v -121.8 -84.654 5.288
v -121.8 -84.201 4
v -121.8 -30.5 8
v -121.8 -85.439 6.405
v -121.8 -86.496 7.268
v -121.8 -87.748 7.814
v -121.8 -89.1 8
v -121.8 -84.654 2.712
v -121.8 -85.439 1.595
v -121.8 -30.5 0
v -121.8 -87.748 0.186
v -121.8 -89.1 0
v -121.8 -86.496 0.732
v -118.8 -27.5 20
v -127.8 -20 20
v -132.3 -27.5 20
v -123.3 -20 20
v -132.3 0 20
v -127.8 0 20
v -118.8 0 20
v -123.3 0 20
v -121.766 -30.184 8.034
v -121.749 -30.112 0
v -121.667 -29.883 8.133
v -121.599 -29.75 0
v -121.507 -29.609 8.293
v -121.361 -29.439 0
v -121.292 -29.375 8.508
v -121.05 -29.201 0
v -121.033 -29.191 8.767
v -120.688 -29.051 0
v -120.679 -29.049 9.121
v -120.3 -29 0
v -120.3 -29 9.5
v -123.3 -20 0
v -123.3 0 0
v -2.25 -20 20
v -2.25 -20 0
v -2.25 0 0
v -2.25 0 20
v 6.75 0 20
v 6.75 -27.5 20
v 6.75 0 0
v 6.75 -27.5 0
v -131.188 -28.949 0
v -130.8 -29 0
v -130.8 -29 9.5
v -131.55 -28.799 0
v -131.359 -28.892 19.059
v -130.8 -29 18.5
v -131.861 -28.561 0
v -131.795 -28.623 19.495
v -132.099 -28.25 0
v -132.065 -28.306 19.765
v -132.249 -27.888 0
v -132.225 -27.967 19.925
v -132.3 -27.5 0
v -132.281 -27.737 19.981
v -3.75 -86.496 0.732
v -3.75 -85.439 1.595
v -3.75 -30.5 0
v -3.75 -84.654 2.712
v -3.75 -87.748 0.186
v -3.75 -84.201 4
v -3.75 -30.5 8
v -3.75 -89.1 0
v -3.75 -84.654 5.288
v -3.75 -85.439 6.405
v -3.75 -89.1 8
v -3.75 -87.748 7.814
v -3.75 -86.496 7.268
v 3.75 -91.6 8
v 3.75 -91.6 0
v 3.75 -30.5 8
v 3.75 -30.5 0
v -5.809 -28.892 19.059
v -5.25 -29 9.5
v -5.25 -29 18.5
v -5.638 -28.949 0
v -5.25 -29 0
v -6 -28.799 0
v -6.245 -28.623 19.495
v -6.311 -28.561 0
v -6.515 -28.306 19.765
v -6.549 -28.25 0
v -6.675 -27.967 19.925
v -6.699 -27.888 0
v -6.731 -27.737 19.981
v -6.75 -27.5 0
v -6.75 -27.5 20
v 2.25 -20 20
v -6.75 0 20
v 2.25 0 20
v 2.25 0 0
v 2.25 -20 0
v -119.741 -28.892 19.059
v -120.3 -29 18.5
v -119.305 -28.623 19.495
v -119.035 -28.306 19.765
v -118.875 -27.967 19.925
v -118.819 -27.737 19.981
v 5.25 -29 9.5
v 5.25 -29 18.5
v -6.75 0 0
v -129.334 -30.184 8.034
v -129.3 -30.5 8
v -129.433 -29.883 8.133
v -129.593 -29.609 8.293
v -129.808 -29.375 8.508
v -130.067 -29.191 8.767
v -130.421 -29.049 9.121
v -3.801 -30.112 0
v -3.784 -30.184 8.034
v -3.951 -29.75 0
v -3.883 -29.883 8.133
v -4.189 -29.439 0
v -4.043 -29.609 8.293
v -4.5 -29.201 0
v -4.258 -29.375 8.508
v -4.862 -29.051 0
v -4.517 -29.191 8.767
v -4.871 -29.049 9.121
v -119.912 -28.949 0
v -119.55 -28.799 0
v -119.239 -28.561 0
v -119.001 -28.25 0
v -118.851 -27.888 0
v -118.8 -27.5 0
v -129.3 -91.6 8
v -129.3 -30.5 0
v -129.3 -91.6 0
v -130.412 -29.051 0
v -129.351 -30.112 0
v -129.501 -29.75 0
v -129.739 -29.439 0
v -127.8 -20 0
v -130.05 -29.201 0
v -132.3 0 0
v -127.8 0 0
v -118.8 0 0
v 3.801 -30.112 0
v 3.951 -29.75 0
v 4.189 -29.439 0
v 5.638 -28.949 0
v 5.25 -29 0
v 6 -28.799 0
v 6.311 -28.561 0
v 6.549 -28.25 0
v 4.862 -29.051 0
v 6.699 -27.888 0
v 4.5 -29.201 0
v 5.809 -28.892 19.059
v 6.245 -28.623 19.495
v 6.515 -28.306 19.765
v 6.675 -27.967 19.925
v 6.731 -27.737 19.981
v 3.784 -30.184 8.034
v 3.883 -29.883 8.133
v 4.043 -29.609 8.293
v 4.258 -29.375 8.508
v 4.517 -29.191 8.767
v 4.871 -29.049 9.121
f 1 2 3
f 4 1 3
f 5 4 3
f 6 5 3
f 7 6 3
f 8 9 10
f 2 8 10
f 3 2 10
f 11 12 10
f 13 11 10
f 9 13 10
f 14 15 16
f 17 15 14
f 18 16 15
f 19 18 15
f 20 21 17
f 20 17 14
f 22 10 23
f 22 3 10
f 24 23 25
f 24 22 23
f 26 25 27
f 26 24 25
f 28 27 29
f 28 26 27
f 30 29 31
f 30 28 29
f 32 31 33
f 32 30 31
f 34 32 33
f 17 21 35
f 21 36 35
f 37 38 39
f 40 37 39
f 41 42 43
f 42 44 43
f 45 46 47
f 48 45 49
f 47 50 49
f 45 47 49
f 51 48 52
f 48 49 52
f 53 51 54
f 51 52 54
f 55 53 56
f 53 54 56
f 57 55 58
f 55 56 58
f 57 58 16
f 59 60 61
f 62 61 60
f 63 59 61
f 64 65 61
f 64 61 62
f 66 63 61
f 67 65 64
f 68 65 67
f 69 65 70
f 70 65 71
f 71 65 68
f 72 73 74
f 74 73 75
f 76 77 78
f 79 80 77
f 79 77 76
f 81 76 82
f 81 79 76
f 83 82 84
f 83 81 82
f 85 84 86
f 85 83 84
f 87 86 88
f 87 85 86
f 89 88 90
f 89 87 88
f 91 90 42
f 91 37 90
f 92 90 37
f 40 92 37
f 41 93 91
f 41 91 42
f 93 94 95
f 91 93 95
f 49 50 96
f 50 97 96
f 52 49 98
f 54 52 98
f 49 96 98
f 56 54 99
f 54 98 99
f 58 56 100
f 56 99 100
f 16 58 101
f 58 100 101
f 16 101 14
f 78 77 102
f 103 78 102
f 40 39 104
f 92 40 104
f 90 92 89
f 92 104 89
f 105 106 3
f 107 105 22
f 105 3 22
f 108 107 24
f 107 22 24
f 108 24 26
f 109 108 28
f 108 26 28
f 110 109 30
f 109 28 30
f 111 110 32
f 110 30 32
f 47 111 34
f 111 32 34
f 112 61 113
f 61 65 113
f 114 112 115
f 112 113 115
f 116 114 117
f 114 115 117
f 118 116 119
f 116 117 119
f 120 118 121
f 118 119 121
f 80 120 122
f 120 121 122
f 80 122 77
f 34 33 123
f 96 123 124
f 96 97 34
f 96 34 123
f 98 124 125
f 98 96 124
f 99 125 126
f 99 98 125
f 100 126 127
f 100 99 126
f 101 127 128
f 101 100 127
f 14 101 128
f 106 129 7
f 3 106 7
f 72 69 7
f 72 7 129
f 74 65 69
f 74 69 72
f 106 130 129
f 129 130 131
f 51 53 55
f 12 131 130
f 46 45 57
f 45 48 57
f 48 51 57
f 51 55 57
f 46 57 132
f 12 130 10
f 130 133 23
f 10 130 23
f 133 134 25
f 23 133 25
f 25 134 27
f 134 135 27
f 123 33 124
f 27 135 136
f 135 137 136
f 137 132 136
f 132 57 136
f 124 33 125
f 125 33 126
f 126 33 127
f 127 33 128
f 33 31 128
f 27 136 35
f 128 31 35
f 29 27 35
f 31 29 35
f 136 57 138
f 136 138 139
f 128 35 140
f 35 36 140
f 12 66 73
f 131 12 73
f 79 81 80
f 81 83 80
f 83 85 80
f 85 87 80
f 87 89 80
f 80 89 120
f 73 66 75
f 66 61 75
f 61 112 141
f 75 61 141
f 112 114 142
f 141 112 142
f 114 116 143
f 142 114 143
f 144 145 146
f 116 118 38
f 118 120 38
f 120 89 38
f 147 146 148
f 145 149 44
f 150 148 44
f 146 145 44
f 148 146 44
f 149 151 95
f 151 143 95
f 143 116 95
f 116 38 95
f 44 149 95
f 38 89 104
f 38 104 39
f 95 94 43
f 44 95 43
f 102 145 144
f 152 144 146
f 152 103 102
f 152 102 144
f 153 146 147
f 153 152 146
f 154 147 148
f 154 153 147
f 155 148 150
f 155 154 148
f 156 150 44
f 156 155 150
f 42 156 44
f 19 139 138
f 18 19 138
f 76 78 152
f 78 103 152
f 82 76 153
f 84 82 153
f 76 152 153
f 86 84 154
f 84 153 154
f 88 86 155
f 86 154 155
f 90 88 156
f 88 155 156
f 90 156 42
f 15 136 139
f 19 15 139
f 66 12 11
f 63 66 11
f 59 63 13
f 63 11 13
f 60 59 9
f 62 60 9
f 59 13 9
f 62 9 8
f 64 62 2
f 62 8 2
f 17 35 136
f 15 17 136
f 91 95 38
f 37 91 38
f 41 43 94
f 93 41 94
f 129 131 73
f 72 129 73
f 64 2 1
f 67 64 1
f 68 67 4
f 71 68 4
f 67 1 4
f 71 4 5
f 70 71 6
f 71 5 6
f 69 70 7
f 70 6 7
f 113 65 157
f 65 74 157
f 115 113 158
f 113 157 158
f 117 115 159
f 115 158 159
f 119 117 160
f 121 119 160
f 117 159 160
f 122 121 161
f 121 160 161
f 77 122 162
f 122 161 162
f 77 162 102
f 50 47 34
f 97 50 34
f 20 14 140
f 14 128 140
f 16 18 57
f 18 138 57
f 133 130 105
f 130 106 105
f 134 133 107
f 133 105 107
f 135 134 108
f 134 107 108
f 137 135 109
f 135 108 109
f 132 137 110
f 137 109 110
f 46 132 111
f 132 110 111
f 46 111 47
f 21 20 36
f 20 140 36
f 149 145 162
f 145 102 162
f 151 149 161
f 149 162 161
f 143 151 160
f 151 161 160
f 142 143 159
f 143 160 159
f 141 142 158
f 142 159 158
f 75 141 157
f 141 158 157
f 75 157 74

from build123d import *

# Parameters (mm, degrees)
F1_DEPTH    = 8
F3_DEPTH    = 12
F4_R        = 1.5
F5_R        = 1.5
F6_T1_DEPTH = 118.05


# Not quite as in the source:
# - a fillet or chamfer that OpenCascade refuses, or shapes differently, is made with other operations: its cross-section is extruded or revolved along the edge and cut away or added


with BuildPart() as f1:
    # F0 (on Top) → F1 (new body)
    with BuildSketch(Plane.XY):
        Polygon((-127.8, 0), (-132.3, 0), (-132.3, -29), (-129.3, -29), (-129.3, -91.6), (3.75, -91.6), (3.75, -29), (6.75, -29), (6.75, 0), (2.25, 0), (2.25, -20), (-2.25, -20), (-2.25, 0), (-6.75, 0), (-6.75, -29), (-3.75, -29), (-3.75, -84.1), (-121.8, -84.1), (-121.8, -29), (-118.8, -29), (-118.8, 0), (-123.3, 0), (-123.3, -20), (-127.8, -20), align=None)
    extrude(amount=F1_DEPTH)

    # F2 (on face) → F3 (join)
    with BuildSketch(Plane.XY.offset(8)):
        Polygon((-127.8, 0), (-132.3, 0), (-132.3, -29), (-118.8, -29), (-118.8, 0), (-123.3, 0), (-123.3, -20), (-127.8, -20), align=None)
        Polygon((-2.25, 0), (-6.75, 0), (-6.75, -29), (6.75, -29), (6.75, 0), (2.25, 0), (2.25, -20), (-2.25, -20), align=None)
    extrude(amount=F3_DEPTH)

    # F4
    f4_edges = [f1.edges().sort_by_distance(p)[0] for p in [
        (-129.3, -29, 4),
        (-125.55, -29, 8),
        (-121.8, -29, 4),
        (-3.75, -29, 4),
        (0, -29, 8),
        (3.75, -29, 4),
    ]]
    fillet(f4_edges, radius=F4_R)

    # F5
    f5_edges = [f1.edges().sort_by_distance(p)[0] for p in [
        (-132.3, -29, 10),
        (-125.55, -29, 20),
        (-118.8, -29, 10),
        (6.75, -29, 10),
        (0, -29, 20),
        (-6.75, -29, 10),
    ]]
    fillet(f5_edges, radius=F5_R)

    # F6: fillet of radius 5 on 2 edges, made by hand

    # F6_s2 → F6_t1 (cut)
    with BuildSketch(Plane.YZ.offset(-121.8)):
        with BuildLine():
            ThreePointArc((-84.1, 3), (-85.5644660941, 6.5355339059), (-89.1, 8))
            Line((-89.1, 8), (-84.1, 8))
            Line((-84.1, 8), (-84.1, 3))
        make_face()
        with BuildLine():
            ThreePointArc((-89.1, 0), (-85.5644660941, 1.4644660941), (-84.1, 5))
            Line((-84.1, 5), (-84.1, 0))
            Line((-84.1, 0), (-89.1, 0))
        make_face()
    extrude(amount=F6_T1_DEPTH, mode=Mode.SUBTRACT)


solid = f1.part
